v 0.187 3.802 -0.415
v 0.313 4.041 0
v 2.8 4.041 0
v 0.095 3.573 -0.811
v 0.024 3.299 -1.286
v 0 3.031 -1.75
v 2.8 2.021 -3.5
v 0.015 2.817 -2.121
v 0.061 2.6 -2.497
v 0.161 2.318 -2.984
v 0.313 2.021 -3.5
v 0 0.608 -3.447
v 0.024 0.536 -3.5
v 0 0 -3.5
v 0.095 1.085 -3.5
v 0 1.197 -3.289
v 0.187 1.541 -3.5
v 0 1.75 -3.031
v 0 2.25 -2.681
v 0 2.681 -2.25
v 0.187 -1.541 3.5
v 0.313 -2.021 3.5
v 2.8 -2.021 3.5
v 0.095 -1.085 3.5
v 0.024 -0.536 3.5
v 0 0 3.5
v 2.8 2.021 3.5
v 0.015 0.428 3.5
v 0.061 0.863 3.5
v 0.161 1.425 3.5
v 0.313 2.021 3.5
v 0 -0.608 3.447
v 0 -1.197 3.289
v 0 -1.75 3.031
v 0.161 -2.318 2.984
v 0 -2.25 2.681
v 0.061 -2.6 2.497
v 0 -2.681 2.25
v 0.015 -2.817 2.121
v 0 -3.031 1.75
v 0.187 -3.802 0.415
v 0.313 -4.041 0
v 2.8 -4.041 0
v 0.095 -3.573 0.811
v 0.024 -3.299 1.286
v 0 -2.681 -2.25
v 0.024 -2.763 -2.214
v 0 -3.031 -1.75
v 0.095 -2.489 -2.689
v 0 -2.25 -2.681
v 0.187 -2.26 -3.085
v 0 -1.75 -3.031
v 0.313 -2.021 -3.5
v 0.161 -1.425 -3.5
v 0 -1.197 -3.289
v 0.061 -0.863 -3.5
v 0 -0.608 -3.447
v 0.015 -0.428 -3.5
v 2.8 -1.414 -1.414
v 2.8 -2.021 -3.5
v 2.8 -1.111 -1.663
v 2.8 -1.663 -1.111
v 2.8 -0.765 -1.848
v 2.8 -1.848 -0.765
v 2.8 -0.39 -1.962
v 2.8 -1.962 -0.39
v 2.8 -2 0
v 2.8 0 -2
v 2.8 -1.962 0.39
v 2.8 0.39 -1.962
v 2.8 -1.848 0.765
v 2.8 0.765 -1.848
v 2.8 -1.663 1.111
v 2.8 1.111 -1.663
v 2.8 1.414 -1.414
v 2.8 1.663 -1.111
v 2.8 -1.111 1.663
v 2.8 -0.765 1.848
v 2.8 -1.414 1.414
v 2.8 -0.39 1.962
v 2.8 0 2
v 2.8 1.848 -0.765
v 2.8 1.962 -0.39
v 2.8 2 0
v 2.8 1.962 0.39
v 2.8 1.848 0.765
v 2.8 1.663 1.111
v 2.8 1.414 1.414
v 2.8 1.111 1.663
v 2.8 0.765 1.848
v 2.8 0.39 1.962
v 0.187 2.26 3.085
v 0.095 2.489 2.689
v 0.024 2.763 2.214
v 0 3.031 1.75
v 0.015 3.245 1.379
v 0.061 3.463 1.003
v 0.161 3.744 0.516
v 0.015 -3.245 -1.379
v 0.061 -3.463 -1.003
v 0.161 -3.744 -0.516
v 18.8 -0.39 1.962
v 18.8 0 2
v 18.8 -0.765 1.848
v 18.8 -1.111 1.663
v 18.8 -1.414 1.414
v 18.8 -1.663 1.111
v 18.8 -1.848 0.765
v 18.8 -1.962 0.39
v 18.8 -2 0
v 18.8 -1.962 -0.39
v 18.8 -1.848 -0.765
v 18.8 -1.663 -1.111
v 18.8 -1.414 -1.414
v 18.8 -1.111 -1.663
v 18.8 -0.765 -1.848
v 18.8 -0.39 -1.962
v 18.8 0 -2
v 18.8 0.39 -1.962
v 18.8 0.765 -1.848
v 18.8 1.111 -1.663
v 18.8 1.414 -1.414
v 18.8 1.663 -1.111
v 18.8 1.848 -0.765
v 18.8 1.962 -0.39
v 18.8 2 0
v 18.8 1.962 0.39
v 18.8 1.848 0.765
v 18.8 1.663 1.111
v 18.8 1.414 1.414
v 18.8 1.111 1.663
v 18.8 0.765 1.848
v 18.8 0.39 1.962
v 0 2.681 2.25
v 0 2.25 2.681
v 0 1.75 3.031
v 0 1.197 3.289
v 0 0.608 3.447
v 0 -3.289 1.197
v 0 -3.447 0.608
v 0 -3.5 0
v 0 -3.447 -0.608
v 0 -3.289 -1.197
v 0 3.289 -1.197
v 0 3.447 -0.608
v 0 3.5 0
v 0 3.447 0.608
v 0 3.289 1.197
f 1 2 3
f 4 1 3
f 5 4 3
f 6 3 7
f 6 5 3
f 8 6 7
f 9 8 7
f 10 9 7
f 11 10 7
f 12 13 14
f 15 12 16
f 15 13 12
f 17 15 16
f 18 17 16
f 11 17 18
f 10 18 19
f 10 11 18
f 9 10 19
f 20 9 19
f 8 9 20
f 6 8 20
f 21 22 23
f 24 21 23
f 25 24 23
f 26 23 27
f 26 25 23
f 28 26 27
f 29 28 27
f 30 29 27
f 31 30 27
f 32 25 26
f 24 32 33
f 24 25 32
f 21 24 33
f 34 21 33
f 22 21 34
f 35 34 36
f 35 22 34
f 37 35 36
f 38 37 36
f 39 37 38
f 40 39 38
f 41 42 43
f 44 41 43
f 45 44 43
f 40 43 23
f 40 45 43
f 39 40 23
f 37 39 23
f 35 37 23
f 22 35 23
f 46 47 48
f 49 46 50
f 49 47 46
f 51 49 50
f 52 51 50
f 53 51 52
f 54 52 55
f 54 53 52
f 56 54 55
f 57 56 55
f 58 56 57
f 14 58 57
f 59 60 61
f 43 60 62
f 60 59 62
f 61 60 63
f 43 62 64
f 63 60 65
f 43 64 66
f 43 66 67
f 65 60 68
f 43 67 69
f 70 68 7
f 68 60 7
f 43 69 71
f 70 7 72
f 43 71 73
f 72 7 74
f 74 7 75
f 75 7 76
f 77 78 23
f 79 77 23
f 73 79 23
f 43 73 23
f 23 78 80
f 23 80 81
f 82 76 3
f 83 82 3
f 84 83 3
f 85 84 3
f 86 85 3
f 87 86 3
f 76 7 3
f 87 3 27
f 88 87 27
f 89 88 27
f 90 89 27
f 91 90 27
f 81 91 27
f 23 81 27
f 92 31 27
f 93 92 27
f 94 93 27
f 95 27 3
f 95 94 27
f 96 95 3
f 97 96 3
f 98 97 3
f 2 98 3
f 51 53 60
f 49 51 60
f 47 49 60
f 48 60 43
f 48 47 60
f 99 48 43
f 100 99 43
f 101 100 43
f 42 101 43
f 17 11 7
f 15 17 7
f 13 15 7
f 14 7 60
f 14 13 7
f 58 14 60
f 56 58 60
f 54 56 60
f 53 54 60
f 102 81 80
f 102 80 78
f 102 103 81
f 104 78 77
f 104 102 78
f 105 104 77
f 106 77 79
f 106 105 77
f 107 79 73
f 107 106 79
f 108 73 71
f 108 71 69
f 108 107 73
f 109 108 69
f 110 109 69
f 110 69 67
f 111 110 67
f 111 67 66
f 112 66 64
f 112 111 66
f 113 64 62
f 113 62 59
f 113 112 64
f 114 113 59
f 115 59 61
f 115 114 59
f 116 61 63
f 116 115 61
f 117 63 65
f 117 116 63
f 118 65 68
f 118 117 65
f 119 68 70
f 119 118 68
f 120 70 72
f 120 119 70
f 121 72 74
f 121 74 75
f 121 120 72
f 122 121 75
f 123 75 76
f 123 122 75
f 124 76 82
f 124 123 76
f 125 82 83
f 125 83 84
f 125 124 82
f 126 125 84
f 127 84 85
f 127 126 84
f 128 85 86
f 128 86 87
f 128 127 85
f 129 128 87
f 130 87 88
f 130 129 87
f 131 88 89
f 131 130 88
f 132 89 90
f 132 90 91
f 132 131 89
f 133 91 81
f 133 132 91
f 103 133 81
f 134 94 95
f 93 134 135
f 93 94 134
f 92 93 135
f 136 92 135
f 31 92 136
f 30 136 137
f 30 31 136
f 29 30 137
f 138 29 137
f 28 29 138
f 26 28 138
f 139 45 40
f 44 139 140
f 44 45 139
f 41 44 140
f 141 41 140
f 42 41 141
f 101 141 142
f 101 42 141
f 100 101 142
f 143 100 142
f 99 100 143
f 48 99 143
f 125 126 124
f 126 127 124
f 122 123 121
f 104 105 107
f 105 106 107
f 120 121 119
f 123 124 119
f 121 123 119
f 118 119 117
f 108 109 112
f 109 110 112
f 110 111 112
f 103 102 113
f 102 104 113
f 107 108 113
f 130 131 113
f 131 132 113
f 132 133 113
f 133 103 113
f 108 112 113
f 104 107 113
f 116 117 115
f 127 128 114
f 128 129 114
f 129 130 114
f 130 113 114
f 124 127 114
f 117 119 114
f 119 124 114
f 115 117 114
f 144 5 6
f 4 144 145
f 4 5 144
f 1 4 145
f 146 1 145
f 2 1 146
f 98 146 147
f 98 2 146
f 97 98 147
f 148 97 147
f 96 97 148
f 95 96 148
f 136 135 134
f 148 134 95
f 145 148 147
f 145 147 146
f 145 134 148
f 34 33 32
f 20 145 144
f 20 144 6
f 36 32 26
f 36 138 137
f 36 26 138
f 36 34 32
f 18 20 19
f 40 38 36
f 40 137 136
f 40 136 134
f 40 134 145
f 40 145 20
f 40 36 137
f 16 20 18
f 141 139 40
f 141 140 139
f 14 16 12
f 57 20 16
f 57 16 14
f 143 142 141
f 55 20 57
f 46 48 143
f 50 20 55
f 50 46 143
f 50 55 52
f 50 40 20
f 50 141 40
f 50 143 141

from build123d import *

# Parameters (mm, degrees)
BASEHEAD_DEPTH = 2.8
BODYSKE_W      = 18.8
BODYSKE_H      = 2


with BuildPart() as part:
    # Sketch1 → BaseHead (new body)
    with BuildSketch(Plane(origin=(0, 0, 0), x_dir=(0, 0, -1), z_dir=(1, 0, 0))):
        Polygon((3.5, 2.020725942), (3.5, -2.020725942), (0, -4.041451884), (-3.5, -2.020725942), (-3.5, 2.020725942), (0, 4.041451884), align=None)
    extrude(amount=BASEHEAD_DEPTH)

    # BodySke → BaseBody (revolve)
    with BuildSketch(Plane.XY, mode=Mode.PRIVATE) as basebody_sk:
        with Locations((9.4, 1)):
            Rectangle(BODYSKE_W, BODYSKE_H)
    revolve(basebody_sk.sketch.rotate(Axis((0, 0, 0), (1, 0, 0)), 90), axis=Axis((0, 0, 0), (1, 0, 0)))

    # Sketch3 → HeadChamfer (revolve, cut)
    with BuildSketch(Plane.XY):
        Polygon((0, 3.5), (3.199358737, 9.041451884), (3.199358737, 14.041451884), (-10, 14.041451884), (-10, 3.5), align=None)
    revolve(axis=Axis((0, 0, 0), (1, 0, 0)), mode=Mode.SUBTRACT)


solid = part.part
